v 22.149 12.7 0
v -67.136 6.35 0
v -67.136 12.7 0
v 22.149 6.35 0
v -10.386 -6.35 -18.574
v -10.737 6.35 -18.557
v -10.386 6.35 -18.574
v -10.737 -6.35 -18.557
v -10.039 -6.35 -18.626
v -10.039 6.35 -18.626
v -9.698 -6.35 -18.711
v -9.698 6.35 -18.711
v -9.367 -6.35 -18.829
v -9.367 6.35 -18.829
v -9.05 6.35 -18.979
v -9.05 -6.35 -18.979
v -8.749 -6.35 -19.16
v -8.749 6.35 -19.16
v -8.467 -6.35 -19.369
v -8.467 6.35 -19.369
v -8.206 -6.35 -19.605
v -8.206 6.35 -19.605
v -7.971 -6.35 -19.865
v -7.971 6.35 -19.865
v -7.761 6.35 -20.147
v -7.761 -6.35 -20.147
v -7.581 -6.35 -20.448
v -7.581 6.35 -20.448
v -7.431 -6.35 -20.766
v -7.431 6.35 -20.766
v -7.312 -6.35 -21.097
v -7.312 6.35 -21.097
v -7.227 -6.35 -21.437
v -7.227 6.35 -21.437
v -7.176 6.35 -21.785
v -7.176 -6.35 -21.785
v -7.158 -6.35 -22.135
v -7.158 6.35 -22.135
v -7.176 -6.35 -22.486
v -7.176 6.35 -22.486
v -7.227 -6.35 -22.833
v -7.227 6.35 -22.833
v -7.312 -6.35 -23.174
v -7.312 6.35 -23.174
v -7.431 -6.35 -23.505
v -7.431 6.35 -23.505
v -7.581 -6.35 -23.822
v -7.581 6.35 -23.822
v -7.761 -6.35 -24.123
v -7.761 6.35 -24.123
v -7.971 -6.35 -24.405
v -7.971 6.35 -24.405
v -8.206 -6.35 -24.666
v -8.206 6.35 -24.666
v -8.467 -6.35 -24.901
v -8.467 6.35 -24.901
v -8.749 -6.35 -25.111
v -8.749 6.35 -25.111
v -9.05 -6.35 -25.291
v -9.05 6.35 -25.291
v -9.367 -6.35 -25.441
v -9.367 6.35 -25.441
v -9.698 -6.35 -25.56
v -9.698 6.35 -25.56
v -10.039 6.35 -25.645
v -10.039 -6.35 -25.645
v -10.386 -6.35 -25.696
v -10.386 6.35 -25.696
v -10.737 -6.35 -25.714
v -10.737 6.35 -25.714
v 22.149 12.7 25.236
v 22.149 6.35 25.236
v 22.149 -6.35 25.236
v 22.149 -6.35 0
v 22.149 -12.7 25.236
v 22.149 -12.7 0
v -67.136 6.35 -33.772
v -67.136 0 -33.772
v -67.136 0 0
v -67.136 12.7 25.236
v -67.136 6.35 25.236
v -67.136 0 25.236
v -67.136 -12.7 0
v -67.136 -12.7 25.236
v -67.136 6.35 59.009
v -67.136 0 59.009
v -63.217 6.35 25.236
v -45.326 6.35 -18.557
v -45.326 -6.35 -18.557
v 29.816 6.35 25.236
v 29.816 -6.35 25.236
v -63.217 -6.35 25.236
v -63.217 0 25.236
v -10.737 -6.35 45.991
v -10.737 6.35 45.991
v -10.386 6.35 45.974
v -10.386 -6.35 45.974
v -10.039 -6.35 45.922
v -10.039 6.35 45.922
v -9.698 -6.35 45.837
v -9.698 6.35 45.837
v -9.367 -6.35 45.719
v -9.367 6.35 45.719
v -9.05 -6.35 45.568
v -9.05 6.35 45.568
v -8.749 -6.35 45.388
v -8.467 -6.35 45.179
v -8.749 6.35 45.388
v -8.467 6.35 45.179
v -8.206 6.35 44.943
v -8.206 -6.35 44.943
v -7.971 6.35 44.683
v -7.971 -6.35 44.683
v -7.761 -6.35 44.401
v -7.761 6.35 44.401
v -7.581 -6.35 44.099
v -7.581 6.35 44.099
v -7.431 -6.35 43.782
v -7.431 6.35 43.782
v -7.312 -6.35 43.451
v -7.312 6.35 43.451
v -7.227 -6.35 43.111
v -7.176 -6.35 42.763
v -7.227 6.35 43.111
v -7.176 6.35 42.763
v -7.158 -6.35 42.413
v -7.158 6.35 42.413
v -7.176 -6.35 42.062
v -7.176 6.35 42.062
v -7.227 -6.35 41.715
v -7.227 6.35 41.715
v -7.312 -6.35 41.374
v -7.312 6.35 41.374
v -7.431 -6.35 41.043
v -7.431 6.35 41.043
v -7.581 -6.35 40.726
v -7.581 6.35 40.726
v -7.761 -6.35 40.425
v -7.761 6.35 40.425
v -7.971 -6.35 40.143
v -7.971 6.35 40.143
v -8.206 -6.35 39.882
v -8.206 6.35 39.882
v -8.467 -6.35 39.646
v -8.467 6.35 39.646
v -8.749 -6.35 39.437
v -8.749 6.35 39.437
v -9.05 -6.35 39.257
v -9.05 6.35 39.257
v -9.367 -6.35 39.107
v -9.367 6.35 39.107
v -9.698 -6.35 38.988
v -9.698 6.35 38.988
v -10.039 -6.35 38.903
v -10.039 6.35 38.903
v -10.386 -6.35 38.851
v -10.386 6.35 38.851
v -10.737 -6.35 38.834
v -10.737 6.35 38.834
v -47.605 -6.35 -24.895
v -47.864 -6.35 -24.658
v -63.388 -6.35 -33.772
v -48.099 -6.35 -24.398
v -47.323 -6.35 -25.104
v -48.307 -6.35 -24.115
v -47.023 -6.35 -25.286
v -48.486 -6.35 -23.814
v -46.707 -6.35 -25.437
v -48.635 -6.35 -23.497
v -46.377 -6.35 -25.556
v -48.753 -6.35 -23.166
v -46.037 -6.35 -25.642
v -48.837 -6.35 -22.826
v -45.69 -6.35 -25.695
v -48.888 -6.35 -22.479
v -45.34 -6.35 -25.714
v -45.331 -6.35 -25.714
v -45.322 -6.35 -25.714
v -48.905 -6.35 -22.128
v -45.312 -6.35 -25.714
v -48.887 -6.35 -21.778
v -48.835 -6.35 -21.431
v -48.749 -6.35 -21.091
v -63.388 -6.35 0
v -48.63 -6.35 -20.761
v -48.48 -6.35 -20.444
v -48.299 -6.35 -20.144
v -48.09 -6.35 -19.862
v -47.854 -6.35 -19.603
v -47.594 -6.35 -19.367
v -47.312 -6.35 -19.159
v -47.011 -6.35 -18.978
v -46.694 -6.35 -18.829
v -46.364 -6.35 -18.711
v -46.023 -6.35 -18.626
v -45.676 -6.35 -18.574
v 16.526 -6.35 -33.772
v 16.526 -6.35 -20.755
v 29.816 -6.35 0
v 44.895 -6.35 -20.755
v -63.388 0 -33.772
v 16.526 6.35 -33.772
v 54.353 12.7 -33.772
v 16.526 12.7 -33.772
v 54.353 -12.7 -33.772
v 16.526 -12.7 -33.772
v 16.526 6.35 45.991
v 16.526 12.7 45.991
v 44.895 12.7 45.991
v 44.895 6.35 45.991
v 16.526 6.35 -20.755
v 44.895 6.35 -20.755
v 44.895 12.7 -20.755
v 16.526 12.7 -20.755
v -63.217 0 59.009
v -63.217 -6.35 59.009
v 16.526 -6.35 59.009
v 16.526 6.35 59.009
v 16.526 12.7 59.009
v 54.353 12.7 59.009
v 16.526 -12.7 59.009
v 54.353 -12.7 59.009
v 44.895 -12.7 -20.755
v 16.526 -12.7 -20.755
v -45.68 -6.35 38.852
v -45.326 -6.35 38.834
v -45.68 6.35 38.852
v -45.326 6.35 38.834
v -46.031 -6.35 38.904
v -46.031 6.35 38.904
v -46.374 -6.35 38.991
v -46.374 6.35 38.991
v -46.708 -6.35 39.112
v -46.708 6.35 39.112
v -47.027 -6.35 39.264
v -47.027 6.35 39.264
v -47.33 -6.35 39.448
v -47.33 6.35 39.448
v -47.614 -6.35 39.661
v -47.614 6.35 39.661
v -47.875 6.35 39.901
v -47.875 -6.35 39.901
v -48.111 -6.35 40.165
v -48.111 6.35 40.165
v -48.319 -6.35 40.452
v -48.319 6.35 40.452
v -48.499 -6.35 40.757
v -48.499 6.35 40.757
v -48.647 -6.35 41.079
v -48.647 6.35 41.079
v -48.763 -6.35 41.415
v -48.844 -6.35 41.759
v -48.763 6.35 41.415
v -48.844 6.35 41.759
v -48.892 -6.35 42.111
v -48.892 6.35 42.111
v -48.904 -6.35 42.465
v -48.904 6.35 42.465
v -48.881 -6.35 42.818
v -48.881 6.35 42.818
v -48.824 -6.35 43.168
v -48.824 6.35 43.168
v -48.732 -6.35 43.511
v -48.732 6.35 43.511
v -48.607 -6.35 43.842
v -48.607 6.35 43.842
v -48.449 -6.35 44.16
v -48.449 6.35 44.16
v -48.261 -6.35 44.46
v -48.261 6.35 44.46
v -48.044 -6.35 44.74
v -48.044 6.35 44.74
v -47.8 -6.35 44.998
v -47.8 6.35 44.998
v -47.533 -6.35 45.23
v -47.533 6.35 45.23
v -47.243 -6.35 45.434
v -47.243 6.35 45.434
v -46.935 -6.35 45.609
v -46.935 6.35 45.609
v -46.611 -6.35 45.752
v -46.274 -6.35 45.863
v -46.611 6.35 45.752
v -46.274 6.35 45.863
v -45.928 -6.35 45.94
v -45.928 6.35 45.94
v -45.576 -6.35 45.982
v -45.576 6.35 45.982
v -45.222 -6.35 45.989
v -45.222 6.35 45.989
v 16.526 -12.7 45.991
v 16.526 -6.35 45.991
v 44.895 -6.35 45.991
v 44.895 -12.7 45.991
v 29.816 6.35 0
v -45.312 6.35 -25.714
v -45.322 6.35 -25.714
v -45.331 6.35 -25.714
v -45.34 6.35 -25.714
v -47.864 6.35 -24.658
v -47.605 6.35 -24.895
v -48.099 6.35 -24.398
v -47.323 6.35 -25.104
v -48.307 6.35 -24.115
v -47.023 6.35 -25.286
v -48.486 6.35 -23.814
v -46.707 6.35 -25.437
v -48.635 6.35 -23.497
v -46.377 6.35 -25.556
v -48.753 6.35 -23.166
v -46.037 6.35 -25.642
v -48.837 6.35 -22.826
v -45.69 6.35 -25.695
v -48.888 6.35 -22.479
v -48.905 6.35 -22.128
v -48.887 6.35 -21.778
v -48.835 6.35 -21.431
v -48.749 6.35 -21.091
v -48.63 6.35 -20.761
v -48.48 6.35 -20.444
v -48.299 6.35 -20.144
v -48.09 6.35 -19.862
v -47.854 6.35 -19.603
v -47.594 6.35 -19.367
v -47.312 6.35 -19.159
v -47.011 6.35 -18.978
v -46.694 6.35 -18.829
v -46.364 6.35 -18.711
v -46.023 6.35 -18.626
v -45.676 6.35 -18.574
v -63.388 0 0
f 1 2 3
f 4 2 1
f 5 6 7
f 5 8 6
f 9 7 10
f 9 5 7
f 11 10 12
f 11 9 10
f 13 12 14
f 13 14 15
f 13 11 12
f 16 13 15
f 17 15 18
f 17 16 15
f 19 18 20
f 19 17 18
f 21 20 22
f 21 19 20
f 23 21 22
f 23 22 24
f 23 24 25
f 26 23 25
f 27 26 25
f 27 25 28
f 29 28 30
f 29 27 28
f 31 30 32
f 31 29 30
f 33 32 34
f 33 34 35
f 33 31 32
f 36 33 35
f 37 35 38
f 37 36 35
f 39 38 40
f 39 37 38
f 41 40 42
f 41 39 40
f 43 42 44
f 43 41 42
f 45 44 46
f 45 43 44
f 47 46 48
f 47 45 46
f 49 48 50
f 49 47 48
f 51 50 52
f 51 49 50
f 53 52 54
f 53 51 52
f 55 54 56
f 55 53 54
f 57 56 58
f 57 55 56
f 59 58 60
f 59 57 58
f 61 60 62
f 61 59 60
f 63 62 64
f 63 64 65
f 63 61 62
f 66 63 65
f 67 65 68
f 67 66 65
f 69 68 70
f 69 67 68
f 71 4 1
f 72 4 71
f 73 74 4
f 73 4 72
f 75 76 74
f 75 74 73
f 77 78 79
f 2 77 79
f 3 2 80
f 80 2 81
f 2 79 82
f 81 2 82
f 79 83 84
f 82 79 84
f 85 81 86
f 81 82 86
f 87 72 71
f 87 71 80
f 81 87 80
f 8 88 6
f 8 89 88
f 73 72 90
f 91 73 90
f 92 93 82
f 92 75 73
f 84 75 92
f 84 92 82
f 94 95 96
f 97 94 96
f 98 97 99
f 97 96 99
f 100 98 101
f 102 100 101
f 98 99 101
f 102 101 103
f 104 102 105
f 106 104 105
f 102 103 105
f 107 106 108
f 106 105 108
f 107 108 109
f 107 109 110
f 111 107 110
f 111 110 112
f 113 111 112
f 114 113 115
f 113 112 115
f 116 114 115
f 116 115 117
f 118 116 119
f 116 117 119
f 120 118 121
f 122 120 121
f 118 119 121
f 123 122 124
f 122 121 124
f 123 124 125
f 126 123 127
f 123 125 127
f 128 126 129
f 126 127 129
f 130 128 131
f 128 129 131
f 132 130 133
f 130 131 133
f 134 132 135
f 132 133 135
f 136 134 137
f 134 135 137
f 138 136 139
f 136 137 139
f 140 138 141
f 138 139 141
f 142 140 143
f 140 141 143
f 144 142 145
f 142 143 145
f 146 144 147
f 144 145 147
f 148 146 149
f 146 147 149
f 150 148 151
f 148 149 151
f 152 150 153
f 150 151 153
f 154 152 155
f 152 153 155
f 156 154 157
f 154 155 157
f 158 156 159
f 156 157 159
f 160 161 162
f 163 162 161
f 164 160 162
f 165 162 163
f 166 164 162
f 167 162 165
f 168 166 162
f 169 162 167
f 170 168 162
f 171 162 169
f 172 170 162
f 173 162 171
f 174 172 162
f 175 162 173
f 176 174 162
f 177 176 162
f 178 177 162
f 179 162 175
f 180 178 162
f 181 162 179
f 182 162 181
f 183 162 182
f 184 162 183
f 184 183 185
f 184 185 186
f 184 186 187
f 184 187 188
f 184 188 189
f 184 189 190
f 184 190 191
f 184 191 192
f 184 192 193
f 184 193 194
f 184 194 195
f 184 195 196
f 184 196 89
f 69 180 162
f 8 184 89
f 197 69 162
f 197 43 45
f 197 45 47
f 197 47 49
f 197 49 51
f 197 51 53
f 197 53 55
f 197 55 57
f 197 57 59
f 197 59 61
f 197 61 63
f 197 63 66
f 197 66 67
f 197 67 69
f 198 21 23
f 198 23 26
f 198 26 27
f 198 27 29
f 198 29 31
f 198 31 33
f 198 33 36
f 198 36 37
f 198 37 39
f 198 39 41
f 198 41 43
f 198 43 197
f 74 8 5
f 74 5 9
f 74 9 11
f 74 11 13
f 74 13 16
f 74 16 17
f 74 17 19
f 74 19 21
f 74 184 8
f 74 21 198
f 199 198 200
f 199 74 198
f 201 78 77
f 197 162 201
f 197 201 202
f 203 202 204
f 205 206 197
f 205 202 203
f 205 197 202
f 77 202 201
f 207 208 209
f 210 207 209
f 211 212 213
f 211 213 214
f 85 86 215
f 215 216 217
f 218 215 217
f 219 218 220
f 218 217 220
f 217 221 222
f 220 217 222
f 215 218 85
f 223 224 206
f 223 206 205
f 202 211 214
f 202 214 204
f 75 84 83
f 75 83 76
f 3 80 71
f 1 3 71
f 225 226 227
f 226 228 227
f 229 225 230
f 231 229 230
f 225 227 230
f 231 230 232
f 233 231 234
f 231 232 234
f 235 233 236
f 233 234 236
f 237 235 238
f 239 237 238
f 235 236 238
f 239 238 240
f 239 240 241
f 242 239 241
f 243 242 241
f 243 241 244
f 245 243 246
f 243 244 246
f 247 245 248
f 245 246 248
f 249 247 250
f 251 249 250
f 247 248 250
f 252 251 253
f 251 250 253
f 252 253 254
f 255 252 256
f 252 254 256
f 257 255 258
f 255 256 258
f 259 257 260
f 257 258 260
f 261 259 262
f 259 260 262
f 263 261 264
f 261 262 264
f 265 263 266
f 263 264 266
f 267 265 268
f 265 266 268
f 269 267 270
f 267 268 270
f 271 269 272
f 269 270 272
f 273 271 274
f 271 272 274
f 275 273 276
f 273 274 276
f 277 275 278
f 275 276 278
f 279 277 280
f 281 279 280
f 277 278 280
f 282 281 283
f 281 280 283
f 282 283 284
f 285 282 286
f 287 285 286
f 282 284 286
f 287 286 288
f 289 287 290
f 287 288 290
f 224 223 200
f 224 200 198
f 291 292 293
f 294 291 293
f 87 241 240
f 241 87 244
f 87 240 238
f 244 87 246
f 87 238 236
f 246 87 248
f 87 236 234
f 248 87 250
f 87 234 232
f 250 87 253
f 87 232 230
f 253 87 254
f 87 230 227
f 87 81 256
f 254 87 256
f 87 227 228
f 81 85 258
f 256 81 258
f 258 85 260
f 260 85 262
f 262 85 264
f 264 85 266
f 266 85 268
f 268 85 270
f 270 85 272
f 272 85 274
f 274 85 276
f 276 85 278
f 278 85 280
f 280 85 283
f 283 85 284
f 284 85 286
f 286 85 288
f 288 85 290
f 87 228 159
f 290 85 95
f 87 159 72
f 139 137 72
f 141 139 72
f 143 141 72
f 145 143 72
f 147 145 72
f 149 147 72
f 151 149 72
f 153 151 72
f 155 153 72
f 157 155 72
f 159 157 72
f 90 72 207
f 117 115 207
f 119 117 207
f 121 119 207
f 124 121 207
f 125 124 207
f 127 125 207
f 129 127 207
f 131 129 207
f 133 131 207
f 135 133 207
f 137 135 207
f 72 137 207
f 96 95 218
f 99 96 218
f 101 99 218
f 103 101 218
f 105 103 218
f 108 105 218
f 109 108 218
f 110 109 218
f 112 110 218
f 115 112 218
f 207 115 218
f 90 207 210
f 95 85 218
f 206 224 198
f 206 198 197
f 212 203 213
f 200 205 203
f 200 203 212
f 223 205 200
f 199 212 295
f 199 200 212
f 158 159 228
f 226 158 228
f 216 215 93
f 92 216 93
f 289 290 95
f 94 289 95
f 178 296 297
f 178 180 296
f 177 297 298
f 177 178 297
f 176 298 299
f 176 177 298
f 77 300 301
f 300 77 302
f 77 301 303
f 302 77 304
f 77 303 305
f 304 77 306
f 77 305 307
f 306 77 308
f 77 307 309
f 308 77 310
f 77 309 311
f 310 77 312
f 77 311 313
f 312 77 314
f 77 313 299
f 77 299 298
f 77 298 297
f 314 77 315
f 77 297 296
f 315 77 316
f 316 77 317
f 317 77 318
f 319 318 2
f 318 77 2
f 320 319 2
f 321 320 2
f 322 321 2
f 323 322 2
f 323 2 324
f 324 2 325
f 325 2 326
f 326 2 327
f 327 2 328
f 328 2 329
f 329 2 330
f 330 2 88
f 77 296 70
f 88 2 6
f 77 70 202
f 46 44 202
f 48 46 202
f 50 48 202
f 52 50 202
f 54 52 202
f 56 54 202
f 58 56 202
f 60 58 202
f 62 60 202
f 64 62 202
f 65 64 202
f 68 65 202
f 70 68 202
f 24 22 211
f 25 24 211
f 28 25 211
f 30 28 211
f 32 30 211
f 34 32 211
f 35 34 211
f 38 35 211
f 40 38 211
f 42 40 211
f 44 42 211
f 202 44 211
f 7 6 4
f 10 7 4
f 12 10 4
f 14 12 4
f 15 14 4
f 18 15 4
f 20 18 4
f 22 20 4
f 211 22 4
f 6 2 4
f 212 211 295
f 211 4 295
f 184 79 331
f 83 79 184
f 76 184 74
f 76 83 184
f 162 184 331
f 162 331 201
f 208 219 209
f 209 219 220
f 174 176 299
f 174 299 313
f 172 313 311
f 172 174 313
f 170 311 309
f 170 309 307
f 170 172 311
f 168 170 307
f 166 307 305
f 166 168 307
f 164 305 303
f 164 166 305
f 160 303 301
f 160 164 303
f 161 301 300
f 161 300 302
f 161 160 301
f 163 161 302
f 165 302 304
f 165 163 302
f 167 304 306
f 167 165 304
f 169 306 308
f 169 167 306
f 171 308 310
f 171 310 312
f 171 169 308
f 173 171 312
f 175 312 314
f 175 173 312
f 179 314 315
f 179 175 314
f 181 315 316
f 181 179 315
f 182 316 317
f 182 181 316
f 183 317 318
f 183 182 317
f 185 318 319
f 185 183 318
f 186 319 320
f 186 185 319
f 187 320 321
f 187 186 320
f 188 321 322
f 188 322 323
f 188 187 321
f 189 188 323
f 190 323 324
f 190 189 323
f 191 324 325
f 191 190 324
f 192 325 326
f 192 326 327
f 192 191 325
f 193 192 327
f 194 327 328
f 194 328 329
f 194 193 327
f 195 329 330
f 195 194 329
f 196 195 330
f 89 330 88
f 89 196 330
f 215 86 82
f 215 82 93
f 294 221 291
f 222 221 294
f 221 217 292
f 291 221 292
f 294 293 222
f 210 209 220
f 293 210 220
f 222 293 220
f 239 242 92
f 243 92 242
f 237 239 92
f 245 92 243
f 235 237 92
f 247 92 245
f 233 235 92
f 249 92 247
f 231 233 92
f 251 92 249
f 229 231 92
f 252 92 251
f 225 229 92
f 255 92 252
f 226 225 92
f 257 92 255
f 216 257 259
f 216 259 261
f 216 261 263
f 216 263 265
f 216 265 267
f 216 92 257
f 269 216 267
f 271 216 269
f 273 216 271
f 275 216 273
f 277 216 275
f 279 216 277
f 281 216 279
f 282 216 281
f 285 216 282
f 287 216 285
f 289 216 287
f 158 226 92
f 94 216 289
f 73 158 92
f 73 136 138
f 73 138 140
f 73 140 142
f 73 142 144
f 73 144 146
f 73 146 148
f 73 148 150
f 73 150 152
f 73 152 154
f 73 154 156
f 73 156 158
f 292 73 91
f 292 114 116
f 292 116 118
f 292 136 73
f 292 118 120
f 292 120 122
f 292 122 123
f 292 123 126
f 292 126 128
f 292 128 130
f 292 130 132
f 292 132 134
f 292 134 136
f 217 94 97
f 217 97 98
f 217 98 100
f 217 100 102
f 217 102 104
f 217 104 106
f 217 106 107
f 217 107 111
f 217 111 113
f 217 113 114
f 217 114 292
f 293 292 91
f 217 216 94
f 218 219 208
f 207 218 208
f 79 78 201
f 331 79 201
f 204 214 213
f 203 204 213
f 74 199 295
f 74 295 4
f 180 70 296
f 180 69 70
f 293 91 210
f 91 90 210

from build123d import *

# Parameters (mm, degrees)
F1_DEPTH = 12.7
F2_DEPTH = 6.35
F3_DEPTH = 12.7
F0_W     = 3.919005394
F0_H     = 33.7724040388
F0_W_2   = 3.7486106157
F4_DEPTH = 6.35


with BuildPart() as f1:
    # F0 (on Front) → F1 (new body, symmetric)
    with BuildSketch(Plane.XZ):
        Polygon((-63.2172524929, 25.2362620085), (-67.1362578869, 25.2362620085), (-67.1362578869, 12.6181310043), (22.1488550305, 12.6181310043), (22.1488550305, 25.2362620085), align=None)
        Polygon((22.1488550305, 12.6181310043), (-67.1362578869, 12.6181310043), (-67.1362578869, 0), (-63.3876472712, 0), (22.1488550305, 0), align=None)
    extrude(amount=F1_DEPTH, both=True)

    # F0 (on Front) → F2 (join, symmetric)
    with BuildSketch(Plane.XZ):
        Polygon((16.5259391069, 59.0086660474), (-63.2172524929, 59.0086660474), (-63.2172524929, 25.2362620085), (22.1488550305, 25.2362620085), (29.8164691776, 25.2362620085), (44.8951655051, 45.9909210103), (16.5259391069, 45.9909210103), align=None)
        with BuildLine():
            ThreePointArc((-45.3261546791, 38.8342062133), (-48.9041308958, 42.4647925685), (-45.2217078929, 45.9893963645))
            Line((-45.2217078929, 45.9893963645), (-10.7368518343, 45.9909210068))
            ThreePointArc((-10.7368518343, 45.9909210068), (-7.1583362305, 42.4126427149), (-10.7366936281, 38.8342062133))
            Line((-10.7366936281, 38.8342062133), (-45.3261546791, 38.8342062133))
        make_face(mode=Mode.SUBTRACT)
        Polygon((29.8164691776, 0), (22.1488550305, 0), (-63.3876472712, 0), (-63.3876472712, -33.7724040388), (16.5259391069, -33.7724040388), (16.5259391069, -20.7546590018), (44.8951655051, -20.7546590018), align=None)
        with BuildLine():
            ThreePointArc((-45.3399057596, -25.7136520276), (-48.9045054721, -22.1284454979), (-45.3261546791, -18.5569636524))
            Line((-45.3261546791, -18.5569636524), (-10.7366936281, -18.5569636524))
            ThreePointArc((-10.7366936281, -18.5569636524), (-7.1583362296, -22.135322417), (-10.7366963604, -25.7136784494))
            Line((-10.7366963604, -25.7136784494), (-45.3124090631, -25.7136520486))
            ThreePointArc((-45.3124090631, -25.7136520486), (-45.3261574114, -25.7136784494), (-45.3399057596, -25.7136520276))
        make_face(mode=Mode.SUBTRACT)
    extrude(amount=F2_DEPTH, both=True)

    # F0 (on Front) → F3 (join, symmetric)
    with BuildSketch(Plane.XZ):
        Polygon((54.3528310955, 59.0086660474), (16.5259391069, 59.0086660474), (16.5259391069, 45.9909210103), (44.8951655051, 45.9909210103), align=None)
        Polygon((54.3528310955, -33.7724040388), (44.8951655051, -20.7546590018), (16.5259391069, -20.7546590018), (16.5259391069, -33.7724040388), align=None)
    extrude(amount=F3_DEPTH, both=True)

    # F0 (on Front) → F4 (join)
    with BuildSketch(Plane.XZ):
        with Locations((-65.1767551899, 42.122464028)):
            Rectangle(F0_W, F0_H)
        with Locations((-65.261952579, -16.8862020194)):
            Rectangle(F0_W_2, F0_H)
    extrude(amount=-F4_DEPTH)


solid = f1.part
